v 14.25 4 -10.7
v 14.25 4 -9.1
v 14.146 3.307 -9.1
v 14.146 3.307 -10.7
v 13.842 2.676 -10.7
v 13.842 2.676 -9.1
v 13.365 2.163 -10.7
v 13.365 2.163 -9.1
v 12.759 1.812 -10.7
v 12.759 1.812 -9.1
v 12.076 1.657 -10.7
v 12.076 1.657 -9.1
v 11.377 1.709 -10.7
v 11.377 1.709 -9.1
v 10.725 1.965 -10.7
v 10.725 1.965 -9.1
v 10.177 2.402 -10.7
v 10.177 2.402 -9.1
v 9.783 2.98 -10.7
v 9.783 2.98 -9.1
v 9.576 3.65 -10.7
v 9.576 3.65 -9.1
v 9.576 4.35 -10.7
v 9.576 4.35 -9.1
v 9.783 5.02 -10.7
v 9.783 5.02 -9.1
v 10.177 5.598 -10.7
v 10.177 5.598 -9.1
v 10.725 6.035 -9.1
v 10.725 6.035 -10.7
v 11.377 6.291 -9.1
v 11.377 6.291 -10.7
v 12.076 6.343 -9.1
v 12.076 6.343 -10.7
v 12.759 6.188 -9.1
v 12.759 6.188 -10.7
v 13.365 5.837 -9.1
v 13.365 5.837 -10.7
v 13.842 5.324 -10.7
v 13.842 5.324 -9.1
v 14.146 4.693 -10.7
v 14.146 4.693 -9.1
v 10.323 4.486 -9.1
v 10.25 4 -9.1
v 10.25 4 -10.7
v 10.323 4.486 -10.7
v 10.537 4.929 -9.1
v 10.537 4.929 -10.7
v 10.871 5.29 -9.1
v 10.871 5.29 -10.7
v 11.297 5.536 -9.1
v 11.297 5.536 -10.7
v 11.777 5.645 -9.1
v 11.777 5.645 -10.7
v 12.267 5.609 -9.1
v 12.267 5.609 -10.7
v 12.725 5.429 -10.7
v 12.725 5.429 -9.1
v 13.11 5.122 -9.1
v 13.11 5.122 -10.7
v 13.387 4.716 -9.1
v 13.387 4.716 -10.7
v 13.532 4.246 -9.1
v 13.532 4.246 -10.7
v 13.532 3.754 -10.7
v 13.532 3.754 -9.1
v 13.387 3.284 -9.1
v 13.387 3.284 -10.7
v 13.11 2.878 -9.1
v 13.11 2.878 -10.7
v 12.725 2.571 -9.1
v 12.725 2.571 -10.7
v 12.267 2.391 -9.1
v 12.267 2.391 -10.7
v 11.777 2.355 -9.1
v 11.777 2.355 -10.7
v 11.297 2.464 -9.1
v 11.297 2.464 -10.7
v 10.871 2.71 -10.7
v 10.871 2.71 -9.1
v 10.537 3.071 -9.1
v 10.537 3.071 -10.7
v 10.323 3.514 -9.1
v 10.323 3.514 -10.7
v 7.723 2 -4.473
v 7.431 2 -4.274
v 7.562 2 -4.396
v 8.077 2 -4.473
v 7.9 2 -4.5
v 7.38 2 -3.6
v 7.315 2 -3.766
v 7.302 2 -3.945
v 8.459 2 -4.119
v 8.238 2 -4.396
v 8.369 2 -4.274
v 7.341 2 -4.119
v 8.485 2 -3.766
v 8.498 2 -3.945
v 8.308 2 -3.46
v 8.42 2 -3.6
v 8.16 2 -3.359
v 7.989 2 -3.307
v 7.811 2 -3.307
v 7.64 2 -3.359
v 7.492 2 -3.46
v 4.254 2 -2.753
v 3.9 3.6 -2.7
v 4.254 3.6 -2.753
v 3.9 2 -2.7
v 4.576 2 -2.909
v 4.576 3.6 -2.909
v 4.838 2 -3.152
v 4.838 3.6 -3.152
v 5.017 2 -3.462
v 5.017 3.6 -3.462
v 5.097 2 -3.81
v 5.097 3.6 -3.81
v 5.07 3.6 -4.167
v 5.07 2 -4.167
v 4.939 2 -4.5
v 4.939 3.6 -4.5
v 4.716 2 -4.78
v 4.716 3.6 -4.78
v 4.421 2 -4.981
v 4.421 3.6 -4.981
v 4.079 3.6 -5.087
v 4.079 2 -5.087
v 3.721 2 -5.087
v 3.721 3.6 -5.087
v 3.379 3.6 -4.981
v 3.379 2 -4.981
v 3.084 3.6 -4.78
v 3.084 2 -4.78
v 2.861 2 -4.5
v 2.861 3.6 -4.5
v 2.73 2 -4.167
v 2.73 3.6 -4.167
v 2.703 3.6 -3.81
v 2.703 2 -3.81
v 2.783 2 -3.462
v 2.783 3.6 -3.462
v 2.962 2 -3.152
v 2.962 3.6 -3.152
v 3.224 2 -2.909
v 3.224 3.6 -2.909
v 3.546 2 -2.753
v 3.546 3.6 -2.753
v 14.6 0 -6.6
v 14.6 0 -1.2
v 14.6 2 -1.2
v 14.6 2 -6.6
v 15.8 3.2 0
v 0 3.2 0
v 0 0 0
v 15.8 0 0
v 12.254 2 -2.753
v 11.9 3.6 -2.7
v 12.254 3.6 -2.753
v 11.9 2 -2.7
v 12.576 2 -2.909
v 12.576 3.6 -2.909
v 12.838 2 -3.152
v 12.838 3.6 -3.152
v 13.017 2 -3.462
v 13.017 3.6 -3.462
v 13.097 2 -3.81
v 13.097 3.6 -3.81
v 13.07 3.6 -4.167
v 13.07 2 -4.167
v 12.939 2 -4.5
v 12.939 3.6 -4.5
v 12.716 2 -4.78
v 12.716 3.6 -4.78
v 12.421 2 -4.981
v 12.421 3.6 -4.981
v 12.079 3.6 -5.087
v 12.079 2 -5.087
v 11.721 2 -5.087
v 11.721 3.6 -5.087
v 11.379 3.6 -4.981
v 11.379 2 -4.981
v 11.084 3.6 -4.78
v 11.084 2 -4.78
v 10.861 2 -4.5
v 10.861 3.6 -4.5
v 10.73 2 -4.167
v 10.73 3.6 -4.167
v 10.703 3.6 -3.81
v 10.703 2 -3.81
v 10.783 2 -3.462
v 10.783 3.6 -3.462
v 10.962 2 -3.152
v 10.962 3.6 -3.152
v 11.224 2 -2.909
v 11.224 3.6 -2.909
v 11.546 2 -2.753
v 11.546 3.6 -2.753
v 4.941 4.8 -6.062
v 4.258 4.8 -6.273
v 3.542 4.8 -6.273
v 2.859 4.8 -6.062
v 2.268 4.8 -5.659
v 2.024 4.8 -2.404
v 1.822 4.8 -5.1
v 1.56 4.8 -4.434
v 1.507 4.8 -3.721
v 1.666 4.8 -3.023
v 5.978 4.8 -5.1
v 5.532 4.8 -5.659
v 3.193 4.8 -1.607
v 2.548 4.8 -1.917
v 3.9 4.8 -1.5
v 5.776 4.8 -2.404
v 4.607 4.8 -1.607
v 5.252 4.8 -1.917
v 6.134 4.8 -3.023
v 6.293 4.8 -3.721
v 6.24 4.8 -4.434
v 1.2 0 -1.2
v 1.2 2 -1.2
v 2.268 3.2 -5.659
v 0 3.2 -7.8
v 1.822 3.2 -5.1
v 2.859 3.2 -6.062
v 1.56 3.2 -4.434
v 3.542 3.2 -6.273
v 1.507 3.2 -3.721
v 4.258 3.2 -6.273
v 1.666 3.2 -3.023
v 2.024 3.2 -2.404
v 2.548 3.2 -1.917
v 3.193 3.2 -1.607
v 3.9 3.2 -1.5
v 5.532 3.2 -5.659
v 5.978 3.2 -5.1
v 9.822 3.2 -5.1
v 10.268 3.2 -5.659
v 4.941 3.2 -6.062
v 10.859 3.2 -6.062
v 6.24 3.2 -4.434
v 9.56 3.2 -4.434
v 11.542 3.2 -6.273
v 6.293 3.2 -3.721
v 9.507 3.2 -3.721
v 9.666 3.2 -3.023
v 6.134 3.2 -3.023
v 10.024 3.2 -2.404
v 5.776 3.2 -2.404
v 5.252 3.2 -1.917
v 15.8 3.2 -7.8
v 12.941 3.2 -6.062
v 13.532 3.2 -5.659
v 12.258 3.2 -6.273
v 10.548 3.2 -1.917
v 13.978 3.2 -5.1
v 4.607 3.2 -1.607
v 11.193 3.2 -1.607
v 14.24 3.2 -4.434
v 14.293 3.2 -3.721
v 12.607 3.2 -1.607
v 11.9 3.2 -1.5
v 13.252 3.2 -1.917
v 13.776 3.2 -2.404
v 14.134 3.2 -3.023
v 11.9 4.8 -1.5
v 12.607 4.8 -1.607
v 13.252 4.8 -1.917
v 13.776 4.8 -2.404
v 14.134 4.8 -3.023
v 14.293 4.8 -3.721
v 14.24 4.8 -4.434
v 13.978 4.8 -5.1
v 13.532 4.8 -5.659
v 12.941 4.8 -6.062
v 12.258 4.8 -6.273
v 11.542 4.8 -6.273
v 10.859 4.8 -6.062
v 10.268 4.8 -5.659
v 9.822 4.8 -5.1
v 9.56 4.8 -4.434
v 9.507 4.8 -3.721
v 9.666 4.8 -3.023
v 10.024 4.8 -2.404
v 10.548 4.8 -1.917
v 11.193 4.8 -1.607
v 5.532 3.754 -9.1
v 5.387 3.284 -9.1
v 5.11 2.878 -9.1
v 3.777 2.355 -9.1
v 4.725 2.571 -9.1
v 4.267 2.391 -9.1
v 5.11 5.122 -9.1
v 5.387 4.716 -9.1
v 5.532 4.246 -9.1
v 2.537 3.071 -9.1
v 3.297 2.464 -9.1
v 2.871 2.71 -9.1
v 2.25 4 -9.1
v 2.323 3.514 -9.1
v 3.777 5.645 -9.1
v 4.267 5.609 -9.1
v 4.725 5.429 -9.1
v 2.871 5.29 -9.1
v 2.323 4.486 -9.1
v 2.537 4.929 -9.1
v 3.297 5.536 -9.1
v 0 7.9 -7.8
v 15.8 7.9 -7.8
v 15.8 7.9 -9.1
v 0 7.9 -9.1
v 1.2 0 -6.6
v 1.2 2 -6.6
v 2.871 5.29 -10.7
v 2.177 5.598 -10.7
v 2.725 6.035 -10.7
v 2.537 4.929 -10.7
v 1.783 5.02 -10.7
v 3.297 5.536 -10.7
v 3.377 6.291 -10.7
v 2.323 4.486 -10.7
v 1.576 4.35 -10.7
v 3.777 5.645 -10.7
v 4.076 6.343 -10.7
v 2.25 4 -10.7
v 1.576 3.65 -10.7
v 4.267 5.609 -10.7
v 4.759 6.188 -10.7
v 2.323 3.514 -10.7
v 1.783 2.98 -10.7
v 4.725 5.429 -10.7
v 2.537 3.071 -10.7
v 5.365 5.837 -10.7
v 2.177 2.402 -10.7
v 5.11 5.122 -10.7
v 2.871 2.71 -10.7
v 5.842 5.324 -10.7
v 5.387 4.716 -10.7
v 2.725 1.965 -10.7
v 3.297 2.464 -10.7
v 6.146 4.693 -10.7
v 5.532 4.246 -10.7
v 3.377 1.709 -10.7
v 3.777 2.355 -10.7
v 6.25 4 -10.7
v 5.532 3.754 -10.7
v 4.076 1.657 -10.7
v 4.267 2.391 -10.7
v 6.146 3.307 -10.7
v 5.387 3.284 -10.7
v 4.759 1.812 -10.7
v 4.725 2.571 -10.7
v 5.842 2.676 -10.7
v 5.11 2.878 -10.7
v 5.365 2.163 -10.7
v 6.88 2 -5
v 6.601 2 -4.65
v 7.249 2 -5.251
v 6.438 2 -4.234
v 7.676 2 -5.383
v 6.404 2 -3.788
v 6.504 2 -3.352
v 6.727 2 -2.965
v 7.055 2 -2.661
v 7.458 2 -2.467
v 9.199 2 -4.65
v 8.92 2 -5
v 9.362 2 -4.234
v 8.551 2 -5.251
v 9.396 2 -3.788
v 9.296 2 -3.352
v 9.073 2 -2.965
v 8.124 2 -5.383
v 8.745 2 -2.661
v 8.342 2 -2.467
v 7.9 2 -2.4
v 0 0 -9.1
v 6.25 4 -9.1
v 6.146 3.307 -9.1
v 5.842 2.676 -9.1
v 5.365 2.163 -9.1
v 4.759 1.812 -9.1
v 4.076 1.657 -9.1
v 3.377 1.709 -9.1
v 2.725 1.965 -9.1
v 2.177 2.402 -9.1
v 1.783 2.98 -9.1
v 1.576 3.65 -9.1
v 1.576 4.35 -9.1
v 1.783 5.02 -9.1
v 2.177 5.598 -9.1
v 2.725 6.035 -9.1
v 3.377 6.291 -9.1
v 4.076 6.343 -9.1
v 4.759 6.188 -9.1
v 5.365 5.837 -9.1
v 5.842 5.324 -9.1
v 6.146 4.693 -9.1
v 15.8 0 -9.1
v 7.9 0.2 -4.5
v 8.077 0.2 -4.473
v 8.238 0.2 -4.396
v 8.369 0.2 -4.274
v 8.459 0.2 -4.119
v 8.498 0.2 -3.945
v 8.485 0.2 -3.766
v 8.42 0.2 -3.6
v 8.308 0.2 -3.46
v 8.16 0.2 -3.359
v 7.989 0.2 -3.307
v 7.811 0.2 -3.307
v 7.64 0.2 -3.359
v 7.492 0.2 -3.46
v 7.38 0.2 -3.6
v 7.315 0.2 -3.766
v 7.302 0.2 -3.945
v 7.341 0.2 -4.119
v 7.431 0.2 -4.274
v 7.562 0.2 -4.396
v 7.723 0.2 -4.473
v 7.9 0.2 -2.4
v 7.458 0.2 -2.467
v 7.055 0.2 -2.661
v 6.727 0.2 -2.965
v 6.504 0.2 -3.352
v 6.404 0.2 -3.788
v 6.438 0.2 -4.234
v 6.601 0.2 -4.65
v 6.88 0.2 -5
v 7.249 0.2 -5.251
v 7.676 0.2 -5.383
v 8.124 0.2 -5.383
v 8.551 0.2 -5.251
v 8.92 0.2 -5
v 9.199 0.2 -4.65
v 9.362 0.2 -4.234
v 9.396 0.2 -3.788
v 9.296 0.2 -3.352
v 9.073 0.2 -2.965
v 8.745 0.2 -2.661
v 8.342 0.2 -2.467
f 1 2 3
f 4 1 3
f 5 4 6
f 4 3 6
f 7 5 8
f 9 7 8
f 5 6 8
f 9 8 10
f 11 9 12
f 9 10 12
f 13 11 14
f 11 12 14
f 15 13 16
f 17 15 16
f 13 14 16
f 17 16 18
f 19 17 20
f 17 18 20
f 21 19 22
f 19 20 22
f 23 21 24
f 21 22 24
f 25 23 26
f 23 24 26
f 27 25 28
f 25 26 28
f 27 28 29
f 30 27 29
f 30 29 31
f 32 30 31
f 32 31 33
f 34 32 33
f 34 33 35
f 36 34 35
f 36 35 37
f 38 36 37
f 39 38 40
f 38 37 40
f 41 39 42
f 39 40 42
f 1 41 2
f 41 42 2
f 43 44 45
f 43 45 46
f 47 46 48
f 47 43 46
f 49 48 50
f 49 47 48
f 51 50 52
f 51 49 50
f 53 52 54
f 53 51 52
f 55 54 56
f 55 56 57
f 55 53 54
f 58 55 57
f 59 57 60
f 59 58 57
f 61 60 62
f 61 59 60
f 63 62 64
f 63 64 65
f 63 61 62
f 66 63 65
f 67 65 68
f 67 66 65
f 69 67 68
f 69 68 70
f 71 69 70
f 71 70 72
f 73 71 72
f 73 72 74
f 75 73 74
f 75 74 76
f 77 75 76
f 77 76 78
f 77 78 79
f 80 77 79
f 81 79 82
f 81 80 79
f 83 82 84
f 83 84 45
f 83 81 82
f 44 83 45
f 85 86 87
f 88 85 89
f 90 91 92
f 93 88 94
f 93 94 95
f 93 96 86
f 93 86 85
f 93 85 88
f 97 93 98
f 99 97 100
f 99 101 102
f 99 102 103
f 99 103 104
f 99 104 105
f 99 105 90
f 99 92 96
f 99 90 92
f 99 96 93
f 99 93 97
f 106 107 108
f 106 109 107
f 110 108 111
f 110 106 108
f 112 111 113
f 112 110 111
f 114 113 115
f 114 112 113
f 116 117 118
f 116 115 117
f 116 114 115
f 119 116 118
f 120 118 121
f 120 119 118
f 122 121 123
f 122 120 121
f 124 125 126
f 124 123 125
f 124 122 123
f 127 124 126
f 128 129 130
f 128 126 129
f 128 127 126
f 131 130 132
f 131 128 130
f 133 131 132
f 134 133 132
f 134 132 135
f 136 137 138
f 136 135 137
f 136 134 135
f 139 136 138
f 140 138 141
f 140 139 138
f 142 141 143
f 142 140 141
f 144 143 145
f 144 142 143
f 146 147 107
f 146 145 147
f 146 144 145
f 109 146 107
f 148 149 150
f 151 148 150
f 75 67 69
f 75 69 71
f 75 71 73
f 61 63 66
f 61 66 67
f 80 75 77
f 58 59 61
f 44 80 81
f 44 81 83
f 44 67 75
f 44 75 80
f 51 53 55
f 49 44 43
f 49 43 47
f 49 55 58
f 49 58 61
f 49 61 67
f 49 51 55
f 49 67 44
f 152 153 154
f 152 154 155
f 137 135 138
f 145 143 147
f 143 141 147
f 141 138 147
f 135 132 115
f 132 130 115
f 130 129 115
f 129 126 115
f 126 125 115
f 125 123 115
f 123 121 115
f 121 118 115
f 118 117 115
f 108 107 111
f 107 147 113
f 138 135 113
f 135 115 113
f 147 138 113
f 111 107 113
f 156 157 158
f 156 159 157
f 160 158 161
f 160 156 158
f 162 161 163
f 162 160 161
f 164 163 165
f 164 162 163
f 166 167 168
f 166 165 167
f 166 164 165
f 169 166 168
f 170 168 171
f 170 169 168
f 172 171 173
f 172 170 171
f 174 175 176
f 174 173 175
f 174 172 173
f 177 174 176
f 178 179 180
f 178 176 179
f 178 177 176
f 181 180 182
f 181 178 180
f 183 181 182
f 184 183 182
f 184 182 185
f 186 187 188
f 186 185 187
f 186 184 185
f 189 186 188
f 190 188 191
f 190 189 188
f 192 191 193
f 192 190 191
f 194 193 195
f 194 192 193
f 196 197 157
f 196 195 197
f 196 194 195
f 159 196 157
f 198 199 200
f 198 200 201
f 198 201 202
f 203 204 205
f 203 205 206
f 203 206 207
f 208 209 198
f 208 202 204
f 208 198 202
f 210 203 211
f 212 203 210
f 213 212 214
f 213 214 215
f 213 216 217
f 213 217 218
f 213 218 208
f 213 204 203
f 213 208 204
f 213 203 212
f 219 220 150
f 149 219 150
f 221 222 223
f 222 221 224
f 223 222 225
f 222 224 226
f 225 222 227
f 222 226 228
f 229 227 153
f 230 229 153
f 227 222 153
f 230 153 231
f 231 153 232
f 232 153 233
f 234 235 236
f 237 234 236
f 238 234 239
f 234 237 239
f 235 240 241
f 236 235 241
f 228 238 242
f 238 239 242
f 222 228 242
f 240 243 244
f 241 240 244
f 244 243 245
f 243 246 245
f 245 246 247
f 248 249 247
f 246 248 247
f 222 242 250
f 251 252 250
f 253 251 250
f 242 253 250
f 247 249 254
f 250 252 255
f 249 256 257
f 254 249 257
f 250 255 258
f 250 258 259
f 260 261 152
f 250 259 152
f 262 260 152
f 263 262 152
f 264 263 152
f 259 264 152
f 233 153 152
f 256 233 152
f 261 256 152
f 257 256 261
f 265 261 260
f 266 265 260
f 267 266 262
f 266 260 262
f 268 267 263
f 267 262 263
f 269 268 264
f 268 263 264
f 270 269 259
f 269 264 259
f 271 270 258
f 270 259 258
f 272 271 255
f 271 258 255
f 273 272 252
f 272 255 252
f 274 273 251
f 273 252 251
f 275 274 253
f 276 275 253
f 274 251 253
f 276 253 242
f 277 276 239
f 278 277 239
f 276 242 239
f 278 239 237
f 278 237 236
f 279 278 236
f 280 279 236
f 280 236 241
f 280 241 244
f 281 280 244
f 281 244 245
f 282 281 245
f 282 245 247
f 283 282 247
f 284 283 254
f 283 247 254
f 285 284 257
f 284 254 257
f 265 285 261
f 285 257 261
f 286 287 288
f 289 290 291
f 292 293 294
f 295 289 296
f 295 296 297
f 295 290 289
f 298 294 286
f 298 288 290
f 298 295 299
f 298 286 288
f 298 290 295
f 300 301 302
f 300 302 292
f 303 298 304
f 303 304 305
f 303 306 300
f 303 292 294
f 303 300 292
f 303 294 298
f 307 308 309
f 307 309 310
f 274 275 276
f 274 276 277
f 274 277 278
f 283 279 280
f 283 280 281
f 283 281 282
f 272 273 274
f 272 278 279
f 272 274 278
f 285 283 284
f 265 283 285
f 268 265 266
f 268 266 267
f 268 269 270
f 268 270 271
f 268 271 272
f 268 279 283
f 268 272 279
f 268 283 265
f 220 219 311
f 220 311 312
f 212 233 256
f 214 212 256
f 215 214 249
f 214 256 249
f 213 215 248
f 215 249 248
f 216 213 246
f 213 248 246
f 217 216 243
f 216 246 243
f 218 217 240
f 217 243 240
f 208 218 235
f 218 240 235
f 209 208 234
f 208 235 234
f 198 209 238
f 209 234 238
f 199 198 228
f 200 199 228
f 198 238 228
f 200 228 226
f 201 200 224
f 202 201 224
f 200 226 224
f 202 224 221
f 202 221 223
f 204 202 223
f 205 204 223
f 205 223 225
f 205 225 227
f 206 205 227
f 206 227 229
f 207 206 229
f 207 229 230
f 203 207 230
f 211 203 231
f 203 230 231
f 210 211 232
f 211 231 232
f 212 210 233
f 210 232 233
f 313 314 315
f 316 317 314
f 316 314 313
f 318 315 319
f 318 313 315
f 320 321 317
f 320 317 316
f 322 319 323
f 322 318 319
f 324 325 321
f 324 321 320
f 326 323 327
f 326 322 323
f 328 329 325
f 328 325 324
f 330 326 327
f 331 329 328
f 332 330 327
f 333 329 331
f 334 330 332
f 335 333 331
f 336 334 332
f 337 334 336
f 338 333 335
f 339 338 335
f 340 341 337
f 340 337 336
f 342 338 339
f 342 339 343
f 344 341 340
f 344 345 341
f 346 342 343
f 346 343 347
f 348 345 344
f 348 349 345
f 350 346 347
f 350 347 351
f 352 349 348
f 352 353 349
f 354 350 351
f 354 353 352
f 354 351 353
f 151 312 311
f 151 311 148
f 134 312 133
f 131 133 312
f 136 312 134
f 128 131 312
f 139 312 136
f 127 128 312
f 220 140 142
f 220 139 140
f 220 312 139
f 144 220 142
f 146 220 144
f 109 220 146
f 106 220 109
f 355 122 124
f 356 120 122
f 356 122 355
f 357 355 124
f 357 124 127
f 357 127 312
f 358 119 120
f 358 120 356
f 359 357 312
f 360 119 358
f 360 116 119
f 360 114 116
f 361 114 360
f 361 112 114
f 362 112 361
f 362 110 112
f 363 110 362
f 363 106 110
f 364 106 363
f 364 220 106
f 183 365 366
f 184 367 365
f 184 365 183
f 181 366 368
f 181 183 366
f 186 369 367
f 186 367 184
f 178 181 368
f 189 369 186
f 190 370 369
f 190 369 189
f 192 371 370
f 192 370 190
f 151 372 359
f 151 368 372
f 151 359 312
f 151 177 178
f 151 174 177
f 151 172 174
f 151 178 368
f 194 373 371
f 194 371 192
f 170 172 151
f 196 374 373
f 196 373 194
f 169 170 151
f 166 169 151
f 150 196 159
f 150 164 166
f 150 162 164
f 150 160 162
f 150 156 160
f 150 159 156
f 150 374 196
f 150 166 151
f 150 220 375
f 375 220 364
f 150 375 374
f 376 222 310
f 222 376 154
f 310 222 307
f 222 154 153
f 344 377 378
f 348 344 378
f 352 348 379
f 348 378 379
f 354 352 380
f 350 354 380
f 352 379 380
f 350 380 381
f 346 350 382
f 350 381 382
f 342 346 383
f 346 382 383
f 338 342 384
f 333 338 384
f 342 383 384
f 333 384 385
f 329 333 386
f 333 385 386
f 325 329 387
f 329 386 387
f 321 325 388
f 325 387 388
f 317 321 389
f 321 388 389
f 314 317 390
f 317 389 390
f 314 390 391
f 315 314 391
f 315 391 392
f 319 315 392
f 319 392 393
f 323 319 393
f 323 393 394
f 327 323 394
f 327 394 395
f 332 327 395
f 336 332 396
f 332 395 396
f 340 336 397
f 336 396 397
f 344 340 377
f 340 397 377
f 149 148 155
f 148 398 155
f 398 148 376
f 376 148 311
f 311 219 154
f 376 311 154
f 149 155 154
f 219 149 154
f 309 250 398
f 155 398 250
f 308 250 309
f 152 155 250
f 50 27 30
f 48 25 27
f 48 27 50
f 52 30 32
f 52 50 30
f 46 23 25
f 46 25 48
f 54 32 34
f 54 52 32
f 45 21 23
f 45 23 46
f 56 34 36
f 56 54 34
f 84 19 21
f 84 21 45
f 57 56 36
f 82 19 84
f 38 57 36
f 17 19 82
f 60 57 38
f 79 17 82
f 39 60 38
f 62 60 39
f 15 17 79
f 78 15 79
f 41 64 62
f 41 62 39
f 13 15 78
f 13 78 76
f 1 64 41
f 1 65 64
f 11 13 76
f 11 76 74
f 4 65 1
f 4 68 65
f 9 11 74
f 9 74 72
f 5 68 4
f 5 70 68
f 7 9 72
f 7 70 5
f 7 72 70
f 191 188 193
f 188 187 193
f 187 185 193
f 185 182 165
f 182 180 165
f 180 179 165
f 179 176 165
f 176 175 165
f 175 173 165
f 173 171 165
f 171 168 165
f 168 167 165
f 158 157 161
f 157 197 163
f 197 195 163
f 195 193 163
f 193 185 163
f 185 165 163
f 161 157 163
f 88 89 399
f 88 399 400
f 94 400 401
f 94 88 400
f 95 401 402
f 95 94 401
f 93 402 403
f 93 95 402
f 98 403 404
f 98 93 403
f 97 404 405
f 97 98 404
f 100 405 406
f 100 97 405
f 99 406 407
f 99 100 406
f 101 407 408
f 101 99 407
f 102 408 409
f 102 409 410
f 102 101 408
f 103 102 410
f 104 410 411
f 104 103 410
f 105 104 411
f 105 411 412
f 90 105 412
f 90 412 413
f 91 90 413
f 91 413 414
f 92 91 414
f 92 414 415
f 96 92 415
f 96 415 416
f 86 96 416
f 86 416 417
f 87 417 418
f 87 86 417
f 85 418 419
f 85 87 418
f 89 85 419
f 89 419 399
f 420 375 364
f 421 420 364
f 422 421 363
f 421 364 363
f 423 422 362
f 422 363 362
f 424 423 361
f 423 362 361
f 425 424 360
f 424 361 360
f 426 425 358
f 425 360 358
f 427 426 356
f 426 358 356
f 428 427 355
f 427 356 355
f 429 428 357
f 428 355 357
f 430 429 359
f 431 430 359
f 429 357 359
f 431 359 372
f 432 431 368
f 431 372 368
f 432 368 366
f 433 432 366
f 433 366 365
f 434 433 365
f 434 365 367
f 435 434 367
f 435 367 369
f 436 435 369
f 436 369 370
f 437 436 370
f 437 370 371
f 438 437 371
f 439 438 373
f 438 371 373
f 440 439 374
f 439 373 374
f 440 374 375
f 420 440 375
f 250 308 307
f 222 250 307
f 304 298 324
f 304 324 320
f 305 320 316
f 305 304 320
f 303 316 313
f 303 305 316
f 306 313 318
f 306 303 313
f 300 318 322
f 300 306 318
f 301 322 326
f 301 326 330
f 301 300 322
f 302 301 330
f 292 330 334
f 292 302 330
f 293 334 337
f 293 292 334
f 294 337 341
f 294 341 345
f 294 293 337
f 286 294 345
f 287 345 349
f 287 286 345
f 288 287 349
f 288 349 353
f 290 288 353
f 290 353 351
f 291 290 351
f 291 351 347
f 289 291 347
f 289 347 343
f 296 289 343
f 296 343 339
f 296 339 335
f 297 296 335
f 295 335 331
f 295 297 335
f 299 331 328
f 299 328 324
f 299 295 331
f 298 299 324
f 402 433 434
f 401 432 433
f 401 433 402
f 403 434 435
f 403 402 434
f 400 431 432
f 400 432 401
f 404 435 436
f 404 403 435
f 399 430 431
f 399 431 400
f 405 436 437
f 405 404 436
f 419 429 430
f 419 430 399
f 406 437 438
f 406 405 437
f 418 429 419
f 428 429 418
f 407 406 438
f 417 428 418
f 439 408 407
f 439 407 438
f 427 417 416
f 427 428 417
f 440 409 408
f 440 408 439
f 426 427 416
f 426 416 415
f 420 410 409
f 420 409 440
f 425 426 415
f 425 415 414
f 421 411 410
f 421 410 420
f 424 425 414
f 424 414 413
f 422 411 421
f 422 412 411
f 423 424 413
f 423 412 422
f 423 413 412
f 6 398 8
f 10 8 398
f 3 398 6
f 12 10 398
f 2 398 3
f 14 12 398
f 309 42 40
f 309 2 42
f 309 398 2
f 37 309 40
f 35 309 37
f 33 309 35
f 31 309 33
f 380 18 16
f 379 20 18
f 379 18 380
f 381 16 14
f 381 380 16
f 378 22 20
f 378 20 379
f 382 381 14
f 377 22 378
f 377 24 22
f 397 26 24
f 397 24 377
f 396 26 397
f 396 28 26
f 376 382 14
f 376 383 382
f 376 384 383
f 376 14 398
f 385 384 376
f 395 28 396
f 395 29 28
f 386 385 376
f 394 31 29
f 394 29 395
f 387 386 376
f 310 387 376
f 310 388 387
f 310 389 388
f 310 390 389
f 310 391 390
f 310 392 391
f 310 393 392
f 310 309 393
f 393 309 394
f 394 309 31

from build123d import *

# Parameters (mm, degrees)
SKETCH1_W            = 15.8
SKETCH1_H            = 3.2
BOSS_EXTRUDE1_DEPTH  = 7.8
SKETCH2_R            = 2.4
BOSS_EXTRUDE2_DEPTH  = 1.6
LPATTERN1_COUNT      = 2
LPATTERN1_PITCH      = 8
LPATTERN1_COUNT_DIR2 = 4
LPATTERN1_PITCH_DIR2 = 8
SHELL1_T             = -1.2
SKETCH3_R            = 1.5
SKETCH3_R_2          = 0.6
BOSS_EXTRUDE3_DEPTH  = 1.8
SKETCH4_W            = 15.8
SKETCH4_H            = 7.9
BOSS_EXTRUDE4_DEPTH  = 1.3
SKETCH5_R            = 2.35
SKETCH5_R_2          = 1.65
BOSS_EXTRUDE5_DEPTH  = 1.6
LPATTERN2_COUNT      = 2
LPATTERN2_PITCH      = 8


with BuildPart() as part:
    # Sketch1 → Boss-Extrude1 (new body)
    with BuildSketch(Plane.XY):
        with Locations((7.9, 1.6)):
            Rectangle(SKETCH1_W, SKETCH1_H)
    extrude(amount=-BOSS_EXTRUDE1_DEPTH)

    # Sketch2 → Boss-Extrude2 (add)
    with BuildSketch(Plane(origin=(0, 3.2, 0), x_dir=(1, 0, 0), z_dir=(0, 1, 0))):
        with Locations(Location((3.9, 3.9, 0), (0, 0, 270))):
            Circle(SKETCH2_R)
    boss_extrude2 = extrude(amount=BOSS_EXTRUDE2_DEPTH)

    # LPattern1: Boss-Extrude2 2 × 4, 6 skipped
    with Locations(*[(j * LPATTERN1_PITCH_DIR2, 0, i * LPATTERN1_PITCH) for i in range(LPATTERN1_COUNT) for j in range(LPATTERN1_COUNT_DIR2) if (i, j) not in ((0, 0), (0, 2), (0, 3), (1, 0), (1, 1), (1, 2), (1, 3))]):
        add(boss_extrude2)

    # Shell1
    shell1_openings = [part.faces().sort_by_distance(p)[0] for p in [
        (7.9, 0, -3.9),
    ]]
    offset(amount=SHELL1_T, openings=shell1_openings, kind=Kind.INTERSECTION)

    # Sketch3 → Boss-Extrude3 (add)
    with BuildSketch(Plane.XZ.offset(-2)):
        with Locations(Location((7.9, -3.9, 0), (0, 0, 90))):
            Circle(SKETCH3_R)
        with Locations(Location((7.9, -3.9, 0), (0, 0, 270))):
            Circle(SKETCH3_R_2, mode=Mode.SUBTRACT)
    extrude(amount=BOSS_EXTRUDE3_DEPTH)

    # Sketch4 → Boss-Extrude4 (add)
    with BuildSketch(Plane(origin=(0, 0, -7.8), x_dir=(-1, 0, 0), z_dir=(0, 0, -1))):
        with Locations((-7.9, 3.95)):
            Rectangle(SKETCH4_W, SKETCH4_H)
    extrude(amount=BOSS_EXTRUDE4_DEPTH)

    # Sketch5 → Boss-Extrude5 (add)
    with BuildSketch(Plane(origin=(0, 0, -9.1), x_dir=(-1, 0, 0), z_dir=(0, 0, -1))):
        with Locations(Location((-11.9, 4, 0), (0, 0, 180))):
            Circle(SKETCH5_R)
        with Locations((-11.9, 4)):
            Circle(SKETCH5_R_2, mode=Mode.SUBTRACT)
    boss_extrude5 = extrude(amount=BOSS_EXTRUDE5_DEPTH)

    # LPattern2: Boss-Extrude5 ×2
    with Locations(*[(-i * LPATTERN2_PITCH, 0, 0) for i in range(1, LPATTERN2_COUNT)]):
        add(boss_extrude5)


solid = part.part
